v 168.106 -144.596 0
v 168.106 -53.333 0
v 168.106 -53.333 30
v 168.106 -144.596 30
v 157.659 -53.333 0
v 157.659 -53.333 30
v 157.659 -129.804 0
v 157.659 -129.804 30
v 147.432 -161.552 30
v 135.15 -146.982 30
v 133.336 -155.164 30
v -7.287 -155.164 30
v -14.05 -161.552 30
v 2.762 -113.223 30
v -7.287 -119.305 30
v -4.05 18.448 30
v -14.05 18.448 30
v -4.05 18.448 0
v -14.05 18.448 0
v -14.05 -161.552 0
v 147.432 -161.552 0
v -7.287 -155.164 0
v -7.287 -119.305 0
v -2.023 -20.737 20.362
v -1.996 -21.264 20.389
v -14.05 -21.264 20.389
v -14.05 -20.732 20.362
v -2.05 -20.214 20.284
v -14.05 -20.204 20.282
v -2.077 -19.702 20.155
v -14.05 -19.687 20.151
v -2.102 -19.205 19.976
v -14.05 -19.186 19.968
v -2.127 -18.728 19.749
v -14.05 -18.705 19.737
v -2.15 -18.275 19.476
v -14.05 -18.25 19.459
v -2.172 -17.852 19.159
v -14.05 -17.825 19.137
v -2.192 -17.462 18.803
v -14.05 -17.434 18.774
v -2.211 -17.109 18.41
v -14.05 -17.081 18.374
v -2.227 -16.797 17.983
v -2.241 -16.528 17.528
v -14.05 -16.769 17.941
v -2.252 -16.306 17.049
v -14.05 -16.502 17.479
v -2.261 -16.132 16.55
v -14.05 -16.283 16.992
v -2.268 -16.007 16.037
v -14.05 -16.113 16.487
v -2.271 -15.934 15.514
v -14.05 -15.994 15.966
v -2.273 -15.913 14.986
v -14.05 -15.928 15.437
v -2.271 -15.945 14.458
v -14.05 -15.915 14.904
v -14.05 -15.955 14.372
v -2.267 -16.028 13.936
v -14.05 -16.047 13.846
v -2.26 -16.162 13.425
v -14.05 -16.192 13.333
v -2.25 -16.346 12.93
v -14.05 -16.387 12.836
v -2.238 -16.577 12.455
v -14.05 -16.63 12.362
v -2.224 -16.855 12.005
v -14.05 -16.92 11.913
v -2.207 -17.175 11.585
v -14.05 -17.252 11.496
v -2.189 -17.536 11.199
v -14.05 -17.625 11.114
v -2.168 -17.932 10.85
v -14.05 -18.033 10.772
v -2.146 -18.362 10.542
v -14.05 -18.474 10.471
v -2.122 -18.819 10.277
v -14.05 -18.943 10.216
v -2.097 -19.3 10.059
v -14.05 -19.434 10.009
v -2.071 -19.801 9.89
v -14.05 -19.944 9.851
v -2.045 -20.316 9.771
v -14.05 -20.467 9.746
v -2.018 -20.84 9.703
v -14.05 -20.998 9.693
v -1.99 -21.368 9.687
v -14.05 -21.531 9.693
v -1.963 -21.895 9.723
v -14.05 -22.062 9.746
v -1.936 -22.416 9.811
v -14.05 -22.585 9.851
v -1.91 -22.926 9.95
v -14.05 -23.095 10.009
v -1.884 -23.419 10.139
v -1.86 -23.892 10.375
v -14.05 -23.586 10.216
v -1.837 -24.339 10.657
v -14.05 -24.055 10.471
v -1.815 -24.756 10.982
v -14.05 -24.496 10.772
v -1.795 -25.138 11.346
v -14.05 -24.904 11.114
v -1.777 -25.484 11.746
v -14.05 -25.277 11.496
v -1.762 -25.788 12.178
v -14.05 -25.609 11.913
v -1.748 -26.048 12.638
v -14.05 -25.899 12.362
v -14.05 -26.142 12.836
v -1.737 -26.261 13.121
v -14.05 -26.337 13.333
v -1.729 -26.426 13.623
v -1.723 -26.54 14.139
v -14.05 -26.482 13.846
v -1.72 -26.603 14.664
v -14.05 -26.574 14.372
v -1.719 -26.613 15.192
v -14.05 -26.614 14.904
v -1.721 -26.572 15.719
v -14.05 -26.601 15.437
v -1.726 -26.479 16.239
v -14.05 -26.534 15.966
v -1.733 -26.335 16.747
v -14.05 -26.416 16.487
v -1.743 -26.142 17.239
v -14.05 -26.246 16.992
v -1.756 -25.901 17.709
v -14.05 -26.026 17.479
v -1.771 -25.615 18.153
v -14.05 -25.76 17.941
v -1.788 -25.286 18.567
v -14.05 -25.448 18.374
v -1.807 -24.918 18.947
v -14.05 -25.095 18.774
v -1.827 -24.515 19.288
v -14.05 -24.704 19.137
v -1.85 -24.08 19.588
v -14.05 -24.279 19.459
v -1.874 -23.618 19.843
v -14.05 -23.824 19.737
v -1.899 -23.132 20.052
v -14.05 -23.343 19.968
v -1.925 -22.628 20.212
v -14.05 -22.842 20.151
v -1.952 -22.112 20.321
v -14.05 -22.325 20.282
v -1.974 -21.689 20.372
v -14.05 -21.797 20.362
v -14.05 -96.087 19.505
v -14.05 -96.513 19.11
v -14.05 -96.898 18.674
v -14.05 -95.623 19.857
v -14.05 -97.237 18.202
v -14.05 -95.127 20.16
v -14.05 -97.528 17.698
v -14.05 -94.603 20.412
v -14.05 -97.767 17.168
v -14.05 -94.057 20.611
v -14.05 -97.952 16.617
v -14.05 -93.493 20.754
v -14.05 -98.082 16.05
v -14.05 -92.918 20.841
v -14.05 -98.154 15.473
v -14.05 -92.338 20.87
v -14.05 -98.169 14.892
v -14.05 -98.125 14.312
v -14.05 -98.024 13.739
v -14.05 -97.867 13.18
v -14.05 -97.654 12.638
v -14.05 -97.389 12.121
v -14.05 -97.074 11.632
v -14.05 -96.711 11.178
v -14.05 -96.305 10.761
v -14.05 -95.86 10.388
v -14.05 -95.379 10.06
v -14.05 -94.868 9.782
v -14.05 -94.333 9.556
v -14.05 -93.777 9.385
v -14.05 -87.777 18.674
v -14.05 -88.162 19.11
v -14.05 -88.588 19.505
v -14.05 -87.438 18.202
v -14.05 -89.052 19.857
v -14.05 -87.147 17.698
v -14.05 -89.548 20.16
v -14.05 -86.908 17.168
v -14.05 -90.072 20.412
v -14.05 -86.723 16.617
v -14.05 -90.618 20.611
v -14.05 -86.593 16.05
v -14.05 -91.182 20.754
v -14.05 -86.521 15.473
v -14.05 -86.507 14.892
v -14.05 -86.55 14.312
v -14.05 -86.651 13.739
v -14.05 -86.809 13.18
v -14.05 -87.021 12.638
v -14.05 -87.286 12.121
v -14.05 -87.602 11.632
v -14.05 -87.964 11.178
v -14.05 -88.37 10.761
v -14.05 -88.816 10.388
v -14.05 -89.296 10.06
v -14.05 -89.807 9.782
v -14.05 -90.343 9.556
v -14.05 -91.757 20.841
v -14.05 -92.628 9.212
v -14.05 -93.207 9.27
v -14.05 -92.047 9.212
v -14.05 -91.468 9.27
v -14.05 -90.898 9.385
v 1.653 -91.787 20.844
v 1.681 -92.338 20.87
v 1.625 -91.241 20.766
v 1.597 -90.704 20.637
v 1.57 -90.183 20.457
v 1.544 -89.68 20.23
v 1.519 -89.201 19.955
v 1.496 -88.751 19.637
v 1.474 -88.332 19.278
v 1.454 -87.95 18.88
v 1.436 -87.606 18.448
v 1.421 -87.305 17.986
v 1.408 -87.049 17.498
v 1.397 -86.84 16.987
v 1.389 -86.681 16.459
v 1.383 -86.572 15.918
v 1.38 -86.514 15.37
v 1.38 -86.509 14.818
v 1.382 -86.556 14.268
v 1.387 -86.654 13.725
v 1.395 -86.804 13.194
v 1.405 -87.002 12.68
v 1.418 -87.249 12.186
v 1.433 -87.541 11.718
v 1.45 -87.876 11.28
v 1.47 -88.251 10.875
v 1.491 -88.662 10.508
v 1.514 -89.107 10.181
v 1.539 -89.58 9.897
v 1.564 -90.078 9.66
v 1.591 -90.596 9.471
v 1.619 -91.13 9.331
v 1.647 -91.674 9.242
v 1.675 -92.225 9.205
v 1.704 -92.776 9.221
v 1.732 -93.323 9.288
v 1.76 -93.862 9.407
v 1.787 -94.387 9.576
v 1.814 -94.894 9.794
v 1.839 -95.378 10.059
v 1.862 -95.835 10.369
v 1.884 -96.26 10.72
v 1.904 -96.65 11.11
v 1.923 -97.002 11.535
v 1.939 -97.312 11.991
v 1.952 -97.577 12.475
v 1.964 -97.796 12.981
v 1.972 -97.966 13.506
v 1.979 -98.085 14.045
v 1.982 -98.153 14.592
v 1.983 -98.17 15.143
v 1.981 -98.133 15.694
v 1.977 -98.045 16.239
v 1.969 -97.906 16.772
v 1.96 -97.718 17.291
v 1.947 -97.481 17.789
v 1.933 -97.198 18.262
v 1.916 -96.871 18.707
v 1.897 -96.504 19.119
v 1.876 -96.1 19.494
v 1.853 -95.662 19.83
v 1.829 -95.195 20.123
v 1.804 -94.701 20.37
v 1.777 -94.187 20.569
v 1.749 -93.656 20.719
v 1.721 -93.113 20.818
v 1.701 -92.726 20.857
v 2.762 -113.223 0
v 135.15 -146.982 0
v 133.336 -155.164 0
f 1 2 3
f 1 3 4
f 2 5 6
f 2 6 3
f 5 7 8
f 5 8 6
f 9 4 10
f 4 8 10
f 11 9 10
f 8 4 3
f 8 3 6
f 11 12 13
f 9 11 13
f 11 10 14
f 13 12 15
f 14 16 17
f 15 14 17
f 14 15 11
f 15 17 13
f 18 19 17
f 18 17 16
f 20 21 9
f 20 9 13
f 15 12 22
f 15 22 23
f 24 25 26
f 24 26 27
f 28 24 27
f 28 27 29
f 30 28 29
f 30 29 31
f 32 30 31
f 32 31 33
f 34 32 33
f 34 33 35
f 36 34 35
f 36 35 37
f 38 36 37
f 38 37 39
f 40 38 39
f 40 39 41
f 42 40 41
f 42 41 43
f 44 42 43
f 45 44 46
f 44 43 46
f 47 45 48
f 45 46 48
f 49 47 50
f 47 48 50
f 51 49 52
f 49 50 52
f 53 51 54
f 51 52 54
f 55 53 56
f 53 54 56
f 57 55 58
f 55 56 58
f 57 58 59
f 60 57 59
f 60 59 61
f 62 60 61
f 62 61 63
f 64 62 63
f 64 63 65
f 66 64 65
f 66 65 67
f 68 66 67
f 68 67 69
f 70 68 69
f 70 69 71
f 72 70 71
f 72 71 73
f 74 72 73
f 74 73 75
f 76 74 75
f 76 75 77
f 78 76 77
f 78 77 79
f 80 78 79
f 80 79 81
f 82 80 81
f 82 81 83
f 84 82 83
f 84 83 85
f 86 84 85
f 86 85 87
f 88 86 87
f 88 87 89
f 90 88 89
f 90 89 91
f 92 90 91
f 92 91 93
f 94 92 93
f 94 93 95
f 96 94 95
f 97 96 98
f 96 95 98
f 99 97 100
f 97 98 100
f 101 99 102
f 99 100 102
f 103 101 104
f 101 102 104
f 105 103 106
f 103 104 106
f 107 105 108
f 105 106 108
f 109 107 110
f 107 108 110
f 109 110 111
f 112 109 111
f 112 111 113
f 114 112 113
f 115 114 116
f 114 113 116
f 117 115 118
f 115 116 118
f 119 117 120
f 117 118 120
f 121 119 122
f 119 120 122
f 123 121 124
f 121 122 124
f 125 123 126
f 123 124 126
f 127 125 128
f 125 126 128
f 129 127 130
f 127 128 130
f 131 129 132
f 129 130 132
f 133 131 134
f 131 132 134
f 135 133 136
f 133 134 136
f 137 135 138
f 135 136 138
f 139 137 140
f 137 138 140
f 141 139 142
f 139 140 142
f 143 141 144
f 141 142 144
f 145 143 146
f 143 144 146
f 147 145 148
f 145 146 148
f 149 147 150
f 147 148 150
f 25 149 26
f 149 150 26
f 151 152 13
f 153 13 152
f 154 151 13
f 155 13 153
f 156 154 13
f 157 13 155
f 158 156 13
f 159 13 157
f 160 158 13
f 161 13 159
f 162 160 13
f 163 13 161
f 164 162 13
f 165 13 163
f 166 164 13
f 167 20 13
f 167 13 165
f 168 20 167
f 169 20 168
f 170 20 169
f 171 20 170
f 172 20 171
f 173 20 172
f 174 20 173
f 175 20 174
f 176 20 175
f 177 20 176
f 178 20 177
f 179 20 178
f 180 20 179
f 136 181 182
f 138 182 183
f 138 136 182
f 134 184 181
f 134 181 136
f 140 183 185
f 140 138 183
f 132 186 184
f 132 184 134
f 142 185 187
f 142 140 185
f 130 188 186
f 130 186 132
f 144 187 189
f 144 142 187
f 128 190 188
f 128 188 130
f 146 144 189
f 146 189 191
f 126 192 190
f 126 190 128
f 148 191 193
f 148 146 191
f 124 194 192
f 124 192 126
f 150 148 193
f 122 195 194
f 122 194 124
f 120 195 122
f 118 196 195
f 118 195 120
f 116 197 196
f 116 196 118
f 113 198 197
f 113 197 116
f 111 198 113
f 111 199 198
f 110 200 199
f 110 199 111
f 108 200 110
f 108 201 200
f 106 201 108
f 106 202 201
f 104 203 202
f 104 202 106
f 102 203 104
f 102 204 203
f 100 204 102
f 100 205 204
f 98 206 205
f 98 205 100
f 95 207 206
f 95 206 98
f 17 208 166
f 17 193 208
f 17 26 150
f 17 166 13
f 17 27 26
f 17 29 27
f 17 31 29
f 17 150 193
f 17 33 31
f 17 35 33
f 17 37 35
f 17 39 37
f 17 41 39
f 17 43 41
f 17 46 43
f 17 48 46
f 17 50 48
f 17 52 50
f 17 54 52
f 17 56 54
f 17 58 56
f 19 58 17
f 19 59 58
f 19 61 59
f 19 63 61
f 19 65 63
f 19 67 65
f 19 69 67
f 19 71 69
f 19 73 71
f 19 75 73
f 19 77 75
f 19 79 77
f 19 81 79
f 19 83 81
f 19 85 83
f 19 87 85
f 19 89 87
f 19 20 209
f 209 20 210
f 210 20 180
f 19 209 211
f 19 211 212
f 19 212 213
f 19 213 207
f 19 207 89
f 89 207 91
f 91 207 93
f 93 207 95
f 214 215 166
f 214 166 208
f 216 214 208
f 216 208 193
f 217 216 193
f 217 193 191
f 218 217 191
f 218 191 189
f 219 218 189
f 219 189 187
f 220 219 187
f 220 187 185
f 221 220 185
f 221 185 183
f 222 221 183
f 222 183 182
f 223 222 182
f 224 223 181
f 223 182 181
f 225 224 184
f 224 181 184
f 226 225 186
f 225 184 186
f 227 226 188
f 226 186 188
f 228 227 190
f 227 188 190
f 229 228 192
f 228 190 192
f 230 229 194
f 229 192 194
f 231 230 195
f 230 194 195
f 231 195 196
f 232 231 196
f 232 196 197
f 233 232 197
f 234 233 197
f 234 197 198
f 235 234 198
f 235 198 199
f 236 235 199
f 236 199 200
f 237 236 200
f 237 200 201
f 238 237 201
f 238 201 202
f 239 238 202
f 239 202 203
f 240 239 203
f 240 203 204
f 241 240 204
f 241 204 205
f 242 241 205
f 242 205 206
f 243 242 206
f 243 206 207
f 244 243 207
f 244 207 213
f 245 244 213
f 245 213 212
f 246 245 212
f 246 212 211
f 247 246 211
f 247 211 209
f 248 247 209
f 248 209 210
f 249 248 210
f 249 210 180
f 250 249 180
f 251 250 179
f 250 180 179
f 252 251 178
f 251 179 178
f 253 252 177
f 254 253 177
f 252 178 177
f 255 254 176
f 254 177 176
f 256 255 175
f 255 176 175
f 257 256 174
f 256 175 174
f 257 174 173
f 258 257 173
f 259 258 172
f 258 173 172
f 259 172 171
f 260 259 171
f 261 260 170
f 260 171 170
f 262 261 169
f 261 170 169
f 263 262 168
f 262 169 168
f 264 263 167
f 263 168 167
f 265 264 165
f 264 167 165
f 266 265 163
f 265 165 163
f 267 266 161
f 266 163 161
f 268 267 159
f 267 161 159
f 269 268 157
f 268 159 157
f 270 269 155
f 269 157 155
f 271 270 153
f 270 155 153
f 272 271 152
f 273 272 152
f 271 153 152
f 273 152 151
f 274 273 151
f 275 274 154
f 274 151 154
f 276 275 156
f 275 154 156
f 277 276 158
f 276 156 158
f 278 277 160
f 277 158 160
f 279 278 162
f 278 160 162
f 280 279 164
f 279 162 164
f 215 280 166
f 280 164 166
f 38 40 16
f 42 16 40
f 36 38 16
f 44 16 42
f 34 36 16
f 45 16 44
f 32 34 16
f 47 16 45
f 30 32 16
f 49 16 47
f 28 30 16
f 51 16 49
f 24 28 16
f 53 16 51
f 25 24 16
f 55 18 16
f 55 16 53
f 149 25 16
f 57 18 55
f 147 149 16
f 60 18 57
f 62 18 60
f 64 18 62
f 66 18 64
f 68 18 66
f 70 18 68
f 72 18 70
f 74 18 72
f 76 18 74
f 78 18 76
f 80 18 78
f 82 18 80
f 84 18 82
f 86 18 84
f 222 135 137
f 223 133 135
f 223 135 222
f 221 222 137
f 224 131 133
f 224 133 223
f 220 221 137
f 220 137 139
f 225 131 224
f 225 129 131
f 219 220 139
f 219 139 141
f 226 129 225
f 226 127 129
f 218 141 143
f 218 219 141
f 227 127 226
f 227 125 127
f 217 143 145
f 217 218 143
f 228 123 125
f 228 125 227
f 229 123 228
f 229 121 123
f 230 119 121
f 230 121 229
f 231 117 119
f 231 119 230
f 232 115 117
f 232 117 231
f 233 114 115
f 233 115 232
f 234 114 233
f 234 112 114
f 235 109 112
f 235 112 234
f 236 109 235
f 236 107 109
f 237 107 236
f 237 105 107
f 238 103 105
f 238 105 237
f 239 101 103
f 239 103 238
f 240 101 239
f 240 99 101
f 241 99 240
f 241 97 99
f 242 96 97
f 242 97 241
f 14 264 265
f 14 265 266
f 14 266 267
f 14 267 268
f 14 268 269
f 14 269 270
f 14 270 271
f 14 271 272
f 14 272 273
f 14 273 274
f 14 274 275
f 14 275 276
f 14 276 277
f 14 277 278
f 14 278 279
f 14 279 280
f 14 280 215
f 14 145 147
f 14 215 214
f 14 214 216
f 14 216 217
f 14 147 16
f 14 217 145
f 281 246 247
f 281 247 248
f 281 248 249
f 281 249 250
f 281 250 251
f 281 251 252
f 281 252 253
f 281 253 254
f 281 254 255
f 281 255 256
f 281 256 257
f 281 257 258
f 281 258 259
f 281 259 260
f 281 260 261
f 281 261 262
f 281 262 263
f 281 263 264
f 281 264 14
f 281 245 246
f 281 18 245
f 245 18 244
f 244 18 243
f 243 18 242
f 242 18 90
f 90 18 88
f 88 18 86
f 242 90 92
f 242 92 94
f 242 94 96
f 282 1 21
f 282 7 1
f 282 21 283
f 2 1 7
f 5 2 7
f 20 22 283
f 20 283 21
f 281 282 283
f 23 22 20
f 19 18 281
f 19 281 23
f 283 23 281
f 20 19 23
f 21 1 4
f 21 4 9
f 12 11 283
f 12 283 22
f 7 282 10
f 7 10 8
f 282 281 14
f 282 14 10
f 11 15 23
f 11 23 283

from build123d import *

# Parameters (mm, degrees)
BOSS_EXTRU_1_DEPTH      = 30
ENL_V_MAT_EXTRU_1_REACH = 247.316
ESQUISSE3_R             = 5.832843768
ESQUISSE3_R_2           = 5.351266955
ENL_V_MAT_EXTRU_2_DEPTH = 236.071663242


with BuildPart() as part:
    # Esquisse1 → Boss.-Extru.1 (new body)
    with BuildSketch(Plane.XY):
        Polygon((-14.050192106, 18.448375062), (-4.050192106, 18.448375062), (2.761752479, -113.222934174), (135.150414635, -146.982486488), (157.659448917, -129.804321414), (157.659448917, -53.333080108), (168.106392916, -53.333080108), (168.106392916, -144.596025192), (147.431500323, -161.551624938), (-14.050192106, -161.551624938), align=None)
    extrude(amount=BOSS_EXTRU_1_DEPTH)

    # Enlèv. mat.-Extru.1: up to this plane
    enl_v_mat_extru_1_end = Plane(origin=(-4.050192106, 18.448375062, 30), z_dir=(-0.9986644529274081, -0.05166537001900487, 0))
    # Esquisse3 → Enlèv. mat.-Extru.1 (cut, up to the surface)
    with BuildSketch(Plane.ZY.offset(14.050192106), mode=Mode.PRIVATE) as enl_v_mat_extru_1_sk1:
        with Locations((15.037241333, -92.337647956)):
            Circle(ESQUISSE3_R)
    enl_v_mat_extru_1_tool1 = split(extrude(enl_v_mat_extru_1_sk1.sketch, amount=-ENL_V_MAT_EXTRU_1_REACH, mode=Mode.PRIVATE), bisect_by=enl_v_mat_extru_1_end, keep=Keep.BOTH, mode=Mode.PRIVATE)
    add(enl_v_mat_extru_1_tool1.solids().sort_by_distance((-14.050192, -92.337648, 15.037241))[0], mode=Mode.SUBTRACT)
    # Esquisse3 → Enlèv. mat.-Extru.1 (cut, up to the surface)
    with BuildSketch(Plane.ZY.offset(14.050192106), mode=Mode.PRIVATE) as enl_v_mat_extru_1_sk2:
        with Locations((15.037241333, -21.264425603)):
            Circle(ESQUISSE3_R_2)
    enl_v_mat_extru_1_tool2 = split(extrude(enl_v_mat_extru_1_sk2.sketch, amount=-ENL_V_MAT_EXTRU_1_REACH, mode=Mode.PRIVATE), bisect_by=enl_v_mat_extru_1_end, keep=Keep.BOTH, mode=Mode.PRIVATE)
    add(enl_v_mat_extru_1_tool2.solids().sort_by_distance((-14.050192, -21.264426, 15.037241))[0], mode=Mode.SUBTRACT)

    # Esquisse5 → Enlèv. mat.-Extru.2 (cut, through all)
    with BuildSketch(Plane.XY.offset(30)):
        Polygon((-7.286706934, -119.304572357), (133.336369925, -155.163928004), (-7.286706934, -155.163928004), align=None)
    extrude(amount=-ENL_V_MAT_EXTRU_2_DEPTH, mode=Mode.SUBTRACT)


solid = part.part
